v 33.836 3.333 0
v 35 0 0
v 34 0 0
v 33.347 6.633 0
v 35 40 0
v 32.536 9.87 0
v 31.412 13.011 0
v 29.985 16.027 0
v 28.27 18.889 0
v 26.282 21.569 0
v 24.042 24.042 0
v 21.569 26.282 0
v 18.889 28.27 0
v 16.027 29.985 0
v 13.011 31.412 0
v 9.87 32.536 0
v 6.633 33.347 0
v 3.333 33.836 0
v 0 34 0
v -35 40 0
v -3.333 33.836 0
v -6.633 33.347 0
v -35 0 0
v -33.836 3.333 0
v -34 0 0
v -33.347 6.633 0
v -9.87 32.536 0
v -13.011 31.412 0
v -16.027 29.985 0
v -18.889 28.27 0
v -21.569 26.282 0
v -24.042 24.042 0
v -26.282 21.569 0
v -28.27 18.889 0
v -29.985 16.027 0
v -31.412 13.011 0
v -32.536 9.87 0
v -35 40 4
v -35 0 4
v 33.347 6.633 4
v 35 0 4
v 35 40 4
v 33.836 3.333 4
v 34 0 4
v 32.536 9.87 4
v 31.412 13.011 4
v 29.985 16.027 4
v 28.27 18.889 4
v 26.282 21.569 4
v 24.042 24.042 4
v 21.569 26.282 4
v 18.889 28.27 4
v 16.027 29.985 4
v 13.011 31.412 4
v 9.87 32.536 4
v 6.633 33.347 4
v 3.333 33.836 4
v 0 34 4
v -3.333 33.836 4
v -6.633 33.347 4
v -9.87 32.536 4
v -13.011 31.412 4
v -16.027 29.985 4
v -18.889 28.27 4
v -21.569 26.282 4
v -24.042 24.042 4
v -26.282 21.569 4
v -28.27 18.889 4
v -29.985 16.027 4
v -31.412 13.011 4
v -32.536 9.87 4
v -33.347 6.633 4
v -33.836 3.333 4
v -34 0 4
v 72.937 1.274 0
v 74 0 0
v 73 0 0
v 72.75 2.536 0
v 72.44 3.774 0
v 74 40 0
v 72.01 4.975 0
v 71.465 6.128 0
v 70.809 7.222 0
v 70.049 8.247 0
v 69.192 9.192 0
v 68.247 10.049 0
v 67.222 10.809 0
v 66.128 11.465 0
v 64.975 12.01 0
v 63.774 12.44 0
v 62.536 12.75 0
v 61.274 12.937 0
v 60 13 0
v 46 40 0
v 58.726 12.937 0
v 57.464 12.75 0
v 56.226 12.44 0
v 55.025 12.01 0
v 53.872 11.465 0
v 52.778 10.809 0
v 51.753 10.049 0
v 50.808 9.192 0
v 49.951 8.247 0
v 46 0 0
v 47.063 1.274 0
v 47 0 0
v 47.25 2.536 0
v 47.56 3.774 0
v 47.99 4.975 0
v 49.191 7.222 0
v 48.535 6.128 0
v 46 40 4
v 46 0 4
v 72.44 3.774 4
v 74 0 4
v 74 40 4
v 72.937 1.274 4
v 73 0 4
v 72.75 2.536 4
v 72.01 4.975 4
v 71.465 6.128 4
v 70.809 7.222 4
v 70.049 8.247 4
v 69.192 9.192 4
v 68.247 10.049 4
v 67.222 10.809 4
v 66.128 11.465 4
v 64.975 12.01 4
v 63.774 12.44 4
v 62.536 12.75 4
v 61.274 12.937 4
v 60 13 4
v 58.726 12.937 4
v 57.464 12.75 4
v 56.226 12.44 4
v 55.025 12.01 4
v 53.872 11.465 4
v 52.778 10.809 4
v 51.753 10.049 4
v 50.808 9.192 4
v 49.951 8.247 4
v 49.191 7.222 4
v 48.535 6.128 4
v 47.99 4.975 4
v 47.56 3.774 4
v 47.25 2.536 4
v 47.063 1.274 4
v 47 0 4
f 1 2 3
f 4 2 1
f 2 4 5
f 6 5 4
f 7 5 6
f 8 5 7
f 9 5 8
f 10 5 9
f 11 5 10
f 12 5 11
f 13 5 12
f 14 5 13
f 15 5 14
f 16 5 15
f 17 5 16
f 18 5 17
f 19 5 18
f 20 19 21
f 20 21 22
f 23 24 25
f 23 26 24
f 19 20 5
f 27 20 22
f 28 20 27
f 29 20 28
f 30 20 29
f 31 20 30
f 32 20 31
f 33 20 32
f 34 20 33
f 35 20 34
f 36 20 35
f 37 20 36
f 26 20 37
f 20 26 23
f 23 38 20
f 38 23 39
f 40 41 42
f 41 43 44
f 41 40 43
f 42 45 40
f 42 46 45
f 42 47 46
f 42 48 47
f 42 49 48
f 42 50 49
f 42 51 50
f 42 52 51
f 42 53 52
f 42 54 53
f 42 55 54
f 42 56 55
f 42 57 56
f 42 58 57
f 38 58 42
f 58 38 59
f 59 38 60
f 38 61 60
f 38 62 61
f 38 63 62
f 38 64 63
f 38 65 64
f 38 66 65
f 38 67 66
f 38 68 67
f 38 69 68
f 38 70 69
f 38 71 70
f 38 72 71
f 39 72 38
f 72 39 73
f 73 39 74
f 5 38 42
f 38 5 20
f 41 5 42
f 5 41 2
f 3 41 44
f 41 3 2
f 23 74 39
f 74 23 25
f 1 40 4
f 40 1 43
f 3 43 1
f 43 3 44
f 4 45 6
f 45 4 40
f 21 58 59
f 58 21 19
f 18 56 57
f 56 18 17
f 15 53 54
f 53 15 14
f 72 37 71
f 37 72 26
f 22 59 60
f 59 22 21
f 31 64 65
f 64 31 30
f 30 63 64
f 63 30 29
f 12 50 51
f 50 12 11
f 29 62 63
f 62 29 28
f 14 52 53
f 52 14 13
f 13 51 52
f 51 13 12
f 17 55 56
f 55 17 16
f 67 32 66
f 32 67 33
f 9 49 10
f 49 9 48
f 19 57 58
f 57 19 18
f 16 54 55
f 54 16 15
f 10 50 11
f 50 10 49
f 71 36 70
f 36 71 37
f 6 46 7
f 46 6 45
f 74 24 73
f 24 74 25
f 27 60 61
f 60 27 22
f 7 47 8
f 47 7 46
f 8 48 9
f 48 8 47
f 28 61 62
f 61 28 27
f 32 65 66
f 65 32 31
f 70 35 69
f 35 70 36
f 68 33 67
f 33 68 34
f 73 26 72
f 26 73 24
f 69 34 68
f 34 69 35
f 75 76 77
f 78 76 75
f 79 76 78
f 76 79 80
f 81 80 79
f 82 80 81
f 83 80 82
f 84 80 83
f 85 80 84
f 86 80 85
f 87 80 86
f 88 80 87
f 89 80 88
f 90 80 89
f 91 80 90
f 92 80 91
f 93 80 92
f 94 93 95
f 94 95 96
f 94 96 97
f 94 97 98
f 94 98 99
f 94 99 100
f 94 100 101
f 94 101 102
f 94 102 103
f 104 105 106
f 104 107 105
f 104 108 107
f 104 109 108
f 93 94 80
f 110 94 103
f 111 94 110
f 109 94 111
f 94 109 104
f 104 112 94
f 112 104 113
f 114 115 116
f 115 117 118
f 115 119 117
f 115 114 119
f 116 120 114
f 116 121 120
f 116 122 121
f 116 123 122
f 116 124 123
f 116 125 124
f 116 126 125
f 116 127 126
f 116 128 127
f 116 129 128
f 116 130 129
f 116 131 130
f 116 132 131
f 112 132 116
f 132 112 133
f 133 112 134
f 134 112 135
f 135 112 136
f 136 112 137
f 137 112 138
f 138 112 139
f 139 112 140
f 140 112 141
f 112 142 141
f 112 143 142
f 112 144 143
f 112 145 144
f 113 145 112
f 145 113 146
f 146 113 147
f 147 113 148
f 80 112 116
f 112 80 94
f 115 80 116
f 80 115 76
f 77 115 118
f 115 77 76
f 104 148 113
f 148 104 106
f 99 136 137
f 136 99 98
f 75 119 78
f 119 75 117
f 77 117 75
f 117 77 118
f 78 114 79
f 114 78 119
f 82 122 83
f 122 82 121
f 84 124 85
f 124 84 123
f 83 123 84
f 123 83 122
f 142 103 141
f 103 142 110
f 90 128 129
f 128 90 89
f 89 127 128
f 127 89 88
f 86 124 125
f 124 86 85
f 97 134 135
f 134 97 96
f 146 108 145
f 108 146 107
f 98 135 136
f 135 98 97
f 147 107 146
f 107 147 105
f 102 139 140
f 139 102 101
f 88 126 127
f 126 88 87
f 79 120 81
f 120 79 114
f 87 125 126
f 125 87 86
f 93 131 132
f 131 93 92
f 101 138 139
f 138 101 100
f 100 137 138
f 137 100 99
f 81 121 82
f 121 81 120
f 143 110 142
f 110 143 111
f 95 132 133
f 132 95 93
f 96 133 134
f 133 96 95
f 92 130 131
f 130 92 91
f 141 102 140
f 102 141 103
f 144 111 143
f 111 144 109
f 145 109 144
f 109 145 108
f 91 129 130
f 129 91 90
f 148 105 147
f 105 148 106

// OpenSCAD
$fn=64;

difference() {
  linear_extrude(4) {
    translate([-35,0,0]) {
      square([70,40],40);
    }
  }
  cylinder(4, 34, 34);
}

translate([60,0,0]) {
  difference() {
    linear_extrude(4) {
      translate([-14,0,0]) {
        square([28,40],19);
      }
    }
    cylinder(4, 13, 13);
  }
}
